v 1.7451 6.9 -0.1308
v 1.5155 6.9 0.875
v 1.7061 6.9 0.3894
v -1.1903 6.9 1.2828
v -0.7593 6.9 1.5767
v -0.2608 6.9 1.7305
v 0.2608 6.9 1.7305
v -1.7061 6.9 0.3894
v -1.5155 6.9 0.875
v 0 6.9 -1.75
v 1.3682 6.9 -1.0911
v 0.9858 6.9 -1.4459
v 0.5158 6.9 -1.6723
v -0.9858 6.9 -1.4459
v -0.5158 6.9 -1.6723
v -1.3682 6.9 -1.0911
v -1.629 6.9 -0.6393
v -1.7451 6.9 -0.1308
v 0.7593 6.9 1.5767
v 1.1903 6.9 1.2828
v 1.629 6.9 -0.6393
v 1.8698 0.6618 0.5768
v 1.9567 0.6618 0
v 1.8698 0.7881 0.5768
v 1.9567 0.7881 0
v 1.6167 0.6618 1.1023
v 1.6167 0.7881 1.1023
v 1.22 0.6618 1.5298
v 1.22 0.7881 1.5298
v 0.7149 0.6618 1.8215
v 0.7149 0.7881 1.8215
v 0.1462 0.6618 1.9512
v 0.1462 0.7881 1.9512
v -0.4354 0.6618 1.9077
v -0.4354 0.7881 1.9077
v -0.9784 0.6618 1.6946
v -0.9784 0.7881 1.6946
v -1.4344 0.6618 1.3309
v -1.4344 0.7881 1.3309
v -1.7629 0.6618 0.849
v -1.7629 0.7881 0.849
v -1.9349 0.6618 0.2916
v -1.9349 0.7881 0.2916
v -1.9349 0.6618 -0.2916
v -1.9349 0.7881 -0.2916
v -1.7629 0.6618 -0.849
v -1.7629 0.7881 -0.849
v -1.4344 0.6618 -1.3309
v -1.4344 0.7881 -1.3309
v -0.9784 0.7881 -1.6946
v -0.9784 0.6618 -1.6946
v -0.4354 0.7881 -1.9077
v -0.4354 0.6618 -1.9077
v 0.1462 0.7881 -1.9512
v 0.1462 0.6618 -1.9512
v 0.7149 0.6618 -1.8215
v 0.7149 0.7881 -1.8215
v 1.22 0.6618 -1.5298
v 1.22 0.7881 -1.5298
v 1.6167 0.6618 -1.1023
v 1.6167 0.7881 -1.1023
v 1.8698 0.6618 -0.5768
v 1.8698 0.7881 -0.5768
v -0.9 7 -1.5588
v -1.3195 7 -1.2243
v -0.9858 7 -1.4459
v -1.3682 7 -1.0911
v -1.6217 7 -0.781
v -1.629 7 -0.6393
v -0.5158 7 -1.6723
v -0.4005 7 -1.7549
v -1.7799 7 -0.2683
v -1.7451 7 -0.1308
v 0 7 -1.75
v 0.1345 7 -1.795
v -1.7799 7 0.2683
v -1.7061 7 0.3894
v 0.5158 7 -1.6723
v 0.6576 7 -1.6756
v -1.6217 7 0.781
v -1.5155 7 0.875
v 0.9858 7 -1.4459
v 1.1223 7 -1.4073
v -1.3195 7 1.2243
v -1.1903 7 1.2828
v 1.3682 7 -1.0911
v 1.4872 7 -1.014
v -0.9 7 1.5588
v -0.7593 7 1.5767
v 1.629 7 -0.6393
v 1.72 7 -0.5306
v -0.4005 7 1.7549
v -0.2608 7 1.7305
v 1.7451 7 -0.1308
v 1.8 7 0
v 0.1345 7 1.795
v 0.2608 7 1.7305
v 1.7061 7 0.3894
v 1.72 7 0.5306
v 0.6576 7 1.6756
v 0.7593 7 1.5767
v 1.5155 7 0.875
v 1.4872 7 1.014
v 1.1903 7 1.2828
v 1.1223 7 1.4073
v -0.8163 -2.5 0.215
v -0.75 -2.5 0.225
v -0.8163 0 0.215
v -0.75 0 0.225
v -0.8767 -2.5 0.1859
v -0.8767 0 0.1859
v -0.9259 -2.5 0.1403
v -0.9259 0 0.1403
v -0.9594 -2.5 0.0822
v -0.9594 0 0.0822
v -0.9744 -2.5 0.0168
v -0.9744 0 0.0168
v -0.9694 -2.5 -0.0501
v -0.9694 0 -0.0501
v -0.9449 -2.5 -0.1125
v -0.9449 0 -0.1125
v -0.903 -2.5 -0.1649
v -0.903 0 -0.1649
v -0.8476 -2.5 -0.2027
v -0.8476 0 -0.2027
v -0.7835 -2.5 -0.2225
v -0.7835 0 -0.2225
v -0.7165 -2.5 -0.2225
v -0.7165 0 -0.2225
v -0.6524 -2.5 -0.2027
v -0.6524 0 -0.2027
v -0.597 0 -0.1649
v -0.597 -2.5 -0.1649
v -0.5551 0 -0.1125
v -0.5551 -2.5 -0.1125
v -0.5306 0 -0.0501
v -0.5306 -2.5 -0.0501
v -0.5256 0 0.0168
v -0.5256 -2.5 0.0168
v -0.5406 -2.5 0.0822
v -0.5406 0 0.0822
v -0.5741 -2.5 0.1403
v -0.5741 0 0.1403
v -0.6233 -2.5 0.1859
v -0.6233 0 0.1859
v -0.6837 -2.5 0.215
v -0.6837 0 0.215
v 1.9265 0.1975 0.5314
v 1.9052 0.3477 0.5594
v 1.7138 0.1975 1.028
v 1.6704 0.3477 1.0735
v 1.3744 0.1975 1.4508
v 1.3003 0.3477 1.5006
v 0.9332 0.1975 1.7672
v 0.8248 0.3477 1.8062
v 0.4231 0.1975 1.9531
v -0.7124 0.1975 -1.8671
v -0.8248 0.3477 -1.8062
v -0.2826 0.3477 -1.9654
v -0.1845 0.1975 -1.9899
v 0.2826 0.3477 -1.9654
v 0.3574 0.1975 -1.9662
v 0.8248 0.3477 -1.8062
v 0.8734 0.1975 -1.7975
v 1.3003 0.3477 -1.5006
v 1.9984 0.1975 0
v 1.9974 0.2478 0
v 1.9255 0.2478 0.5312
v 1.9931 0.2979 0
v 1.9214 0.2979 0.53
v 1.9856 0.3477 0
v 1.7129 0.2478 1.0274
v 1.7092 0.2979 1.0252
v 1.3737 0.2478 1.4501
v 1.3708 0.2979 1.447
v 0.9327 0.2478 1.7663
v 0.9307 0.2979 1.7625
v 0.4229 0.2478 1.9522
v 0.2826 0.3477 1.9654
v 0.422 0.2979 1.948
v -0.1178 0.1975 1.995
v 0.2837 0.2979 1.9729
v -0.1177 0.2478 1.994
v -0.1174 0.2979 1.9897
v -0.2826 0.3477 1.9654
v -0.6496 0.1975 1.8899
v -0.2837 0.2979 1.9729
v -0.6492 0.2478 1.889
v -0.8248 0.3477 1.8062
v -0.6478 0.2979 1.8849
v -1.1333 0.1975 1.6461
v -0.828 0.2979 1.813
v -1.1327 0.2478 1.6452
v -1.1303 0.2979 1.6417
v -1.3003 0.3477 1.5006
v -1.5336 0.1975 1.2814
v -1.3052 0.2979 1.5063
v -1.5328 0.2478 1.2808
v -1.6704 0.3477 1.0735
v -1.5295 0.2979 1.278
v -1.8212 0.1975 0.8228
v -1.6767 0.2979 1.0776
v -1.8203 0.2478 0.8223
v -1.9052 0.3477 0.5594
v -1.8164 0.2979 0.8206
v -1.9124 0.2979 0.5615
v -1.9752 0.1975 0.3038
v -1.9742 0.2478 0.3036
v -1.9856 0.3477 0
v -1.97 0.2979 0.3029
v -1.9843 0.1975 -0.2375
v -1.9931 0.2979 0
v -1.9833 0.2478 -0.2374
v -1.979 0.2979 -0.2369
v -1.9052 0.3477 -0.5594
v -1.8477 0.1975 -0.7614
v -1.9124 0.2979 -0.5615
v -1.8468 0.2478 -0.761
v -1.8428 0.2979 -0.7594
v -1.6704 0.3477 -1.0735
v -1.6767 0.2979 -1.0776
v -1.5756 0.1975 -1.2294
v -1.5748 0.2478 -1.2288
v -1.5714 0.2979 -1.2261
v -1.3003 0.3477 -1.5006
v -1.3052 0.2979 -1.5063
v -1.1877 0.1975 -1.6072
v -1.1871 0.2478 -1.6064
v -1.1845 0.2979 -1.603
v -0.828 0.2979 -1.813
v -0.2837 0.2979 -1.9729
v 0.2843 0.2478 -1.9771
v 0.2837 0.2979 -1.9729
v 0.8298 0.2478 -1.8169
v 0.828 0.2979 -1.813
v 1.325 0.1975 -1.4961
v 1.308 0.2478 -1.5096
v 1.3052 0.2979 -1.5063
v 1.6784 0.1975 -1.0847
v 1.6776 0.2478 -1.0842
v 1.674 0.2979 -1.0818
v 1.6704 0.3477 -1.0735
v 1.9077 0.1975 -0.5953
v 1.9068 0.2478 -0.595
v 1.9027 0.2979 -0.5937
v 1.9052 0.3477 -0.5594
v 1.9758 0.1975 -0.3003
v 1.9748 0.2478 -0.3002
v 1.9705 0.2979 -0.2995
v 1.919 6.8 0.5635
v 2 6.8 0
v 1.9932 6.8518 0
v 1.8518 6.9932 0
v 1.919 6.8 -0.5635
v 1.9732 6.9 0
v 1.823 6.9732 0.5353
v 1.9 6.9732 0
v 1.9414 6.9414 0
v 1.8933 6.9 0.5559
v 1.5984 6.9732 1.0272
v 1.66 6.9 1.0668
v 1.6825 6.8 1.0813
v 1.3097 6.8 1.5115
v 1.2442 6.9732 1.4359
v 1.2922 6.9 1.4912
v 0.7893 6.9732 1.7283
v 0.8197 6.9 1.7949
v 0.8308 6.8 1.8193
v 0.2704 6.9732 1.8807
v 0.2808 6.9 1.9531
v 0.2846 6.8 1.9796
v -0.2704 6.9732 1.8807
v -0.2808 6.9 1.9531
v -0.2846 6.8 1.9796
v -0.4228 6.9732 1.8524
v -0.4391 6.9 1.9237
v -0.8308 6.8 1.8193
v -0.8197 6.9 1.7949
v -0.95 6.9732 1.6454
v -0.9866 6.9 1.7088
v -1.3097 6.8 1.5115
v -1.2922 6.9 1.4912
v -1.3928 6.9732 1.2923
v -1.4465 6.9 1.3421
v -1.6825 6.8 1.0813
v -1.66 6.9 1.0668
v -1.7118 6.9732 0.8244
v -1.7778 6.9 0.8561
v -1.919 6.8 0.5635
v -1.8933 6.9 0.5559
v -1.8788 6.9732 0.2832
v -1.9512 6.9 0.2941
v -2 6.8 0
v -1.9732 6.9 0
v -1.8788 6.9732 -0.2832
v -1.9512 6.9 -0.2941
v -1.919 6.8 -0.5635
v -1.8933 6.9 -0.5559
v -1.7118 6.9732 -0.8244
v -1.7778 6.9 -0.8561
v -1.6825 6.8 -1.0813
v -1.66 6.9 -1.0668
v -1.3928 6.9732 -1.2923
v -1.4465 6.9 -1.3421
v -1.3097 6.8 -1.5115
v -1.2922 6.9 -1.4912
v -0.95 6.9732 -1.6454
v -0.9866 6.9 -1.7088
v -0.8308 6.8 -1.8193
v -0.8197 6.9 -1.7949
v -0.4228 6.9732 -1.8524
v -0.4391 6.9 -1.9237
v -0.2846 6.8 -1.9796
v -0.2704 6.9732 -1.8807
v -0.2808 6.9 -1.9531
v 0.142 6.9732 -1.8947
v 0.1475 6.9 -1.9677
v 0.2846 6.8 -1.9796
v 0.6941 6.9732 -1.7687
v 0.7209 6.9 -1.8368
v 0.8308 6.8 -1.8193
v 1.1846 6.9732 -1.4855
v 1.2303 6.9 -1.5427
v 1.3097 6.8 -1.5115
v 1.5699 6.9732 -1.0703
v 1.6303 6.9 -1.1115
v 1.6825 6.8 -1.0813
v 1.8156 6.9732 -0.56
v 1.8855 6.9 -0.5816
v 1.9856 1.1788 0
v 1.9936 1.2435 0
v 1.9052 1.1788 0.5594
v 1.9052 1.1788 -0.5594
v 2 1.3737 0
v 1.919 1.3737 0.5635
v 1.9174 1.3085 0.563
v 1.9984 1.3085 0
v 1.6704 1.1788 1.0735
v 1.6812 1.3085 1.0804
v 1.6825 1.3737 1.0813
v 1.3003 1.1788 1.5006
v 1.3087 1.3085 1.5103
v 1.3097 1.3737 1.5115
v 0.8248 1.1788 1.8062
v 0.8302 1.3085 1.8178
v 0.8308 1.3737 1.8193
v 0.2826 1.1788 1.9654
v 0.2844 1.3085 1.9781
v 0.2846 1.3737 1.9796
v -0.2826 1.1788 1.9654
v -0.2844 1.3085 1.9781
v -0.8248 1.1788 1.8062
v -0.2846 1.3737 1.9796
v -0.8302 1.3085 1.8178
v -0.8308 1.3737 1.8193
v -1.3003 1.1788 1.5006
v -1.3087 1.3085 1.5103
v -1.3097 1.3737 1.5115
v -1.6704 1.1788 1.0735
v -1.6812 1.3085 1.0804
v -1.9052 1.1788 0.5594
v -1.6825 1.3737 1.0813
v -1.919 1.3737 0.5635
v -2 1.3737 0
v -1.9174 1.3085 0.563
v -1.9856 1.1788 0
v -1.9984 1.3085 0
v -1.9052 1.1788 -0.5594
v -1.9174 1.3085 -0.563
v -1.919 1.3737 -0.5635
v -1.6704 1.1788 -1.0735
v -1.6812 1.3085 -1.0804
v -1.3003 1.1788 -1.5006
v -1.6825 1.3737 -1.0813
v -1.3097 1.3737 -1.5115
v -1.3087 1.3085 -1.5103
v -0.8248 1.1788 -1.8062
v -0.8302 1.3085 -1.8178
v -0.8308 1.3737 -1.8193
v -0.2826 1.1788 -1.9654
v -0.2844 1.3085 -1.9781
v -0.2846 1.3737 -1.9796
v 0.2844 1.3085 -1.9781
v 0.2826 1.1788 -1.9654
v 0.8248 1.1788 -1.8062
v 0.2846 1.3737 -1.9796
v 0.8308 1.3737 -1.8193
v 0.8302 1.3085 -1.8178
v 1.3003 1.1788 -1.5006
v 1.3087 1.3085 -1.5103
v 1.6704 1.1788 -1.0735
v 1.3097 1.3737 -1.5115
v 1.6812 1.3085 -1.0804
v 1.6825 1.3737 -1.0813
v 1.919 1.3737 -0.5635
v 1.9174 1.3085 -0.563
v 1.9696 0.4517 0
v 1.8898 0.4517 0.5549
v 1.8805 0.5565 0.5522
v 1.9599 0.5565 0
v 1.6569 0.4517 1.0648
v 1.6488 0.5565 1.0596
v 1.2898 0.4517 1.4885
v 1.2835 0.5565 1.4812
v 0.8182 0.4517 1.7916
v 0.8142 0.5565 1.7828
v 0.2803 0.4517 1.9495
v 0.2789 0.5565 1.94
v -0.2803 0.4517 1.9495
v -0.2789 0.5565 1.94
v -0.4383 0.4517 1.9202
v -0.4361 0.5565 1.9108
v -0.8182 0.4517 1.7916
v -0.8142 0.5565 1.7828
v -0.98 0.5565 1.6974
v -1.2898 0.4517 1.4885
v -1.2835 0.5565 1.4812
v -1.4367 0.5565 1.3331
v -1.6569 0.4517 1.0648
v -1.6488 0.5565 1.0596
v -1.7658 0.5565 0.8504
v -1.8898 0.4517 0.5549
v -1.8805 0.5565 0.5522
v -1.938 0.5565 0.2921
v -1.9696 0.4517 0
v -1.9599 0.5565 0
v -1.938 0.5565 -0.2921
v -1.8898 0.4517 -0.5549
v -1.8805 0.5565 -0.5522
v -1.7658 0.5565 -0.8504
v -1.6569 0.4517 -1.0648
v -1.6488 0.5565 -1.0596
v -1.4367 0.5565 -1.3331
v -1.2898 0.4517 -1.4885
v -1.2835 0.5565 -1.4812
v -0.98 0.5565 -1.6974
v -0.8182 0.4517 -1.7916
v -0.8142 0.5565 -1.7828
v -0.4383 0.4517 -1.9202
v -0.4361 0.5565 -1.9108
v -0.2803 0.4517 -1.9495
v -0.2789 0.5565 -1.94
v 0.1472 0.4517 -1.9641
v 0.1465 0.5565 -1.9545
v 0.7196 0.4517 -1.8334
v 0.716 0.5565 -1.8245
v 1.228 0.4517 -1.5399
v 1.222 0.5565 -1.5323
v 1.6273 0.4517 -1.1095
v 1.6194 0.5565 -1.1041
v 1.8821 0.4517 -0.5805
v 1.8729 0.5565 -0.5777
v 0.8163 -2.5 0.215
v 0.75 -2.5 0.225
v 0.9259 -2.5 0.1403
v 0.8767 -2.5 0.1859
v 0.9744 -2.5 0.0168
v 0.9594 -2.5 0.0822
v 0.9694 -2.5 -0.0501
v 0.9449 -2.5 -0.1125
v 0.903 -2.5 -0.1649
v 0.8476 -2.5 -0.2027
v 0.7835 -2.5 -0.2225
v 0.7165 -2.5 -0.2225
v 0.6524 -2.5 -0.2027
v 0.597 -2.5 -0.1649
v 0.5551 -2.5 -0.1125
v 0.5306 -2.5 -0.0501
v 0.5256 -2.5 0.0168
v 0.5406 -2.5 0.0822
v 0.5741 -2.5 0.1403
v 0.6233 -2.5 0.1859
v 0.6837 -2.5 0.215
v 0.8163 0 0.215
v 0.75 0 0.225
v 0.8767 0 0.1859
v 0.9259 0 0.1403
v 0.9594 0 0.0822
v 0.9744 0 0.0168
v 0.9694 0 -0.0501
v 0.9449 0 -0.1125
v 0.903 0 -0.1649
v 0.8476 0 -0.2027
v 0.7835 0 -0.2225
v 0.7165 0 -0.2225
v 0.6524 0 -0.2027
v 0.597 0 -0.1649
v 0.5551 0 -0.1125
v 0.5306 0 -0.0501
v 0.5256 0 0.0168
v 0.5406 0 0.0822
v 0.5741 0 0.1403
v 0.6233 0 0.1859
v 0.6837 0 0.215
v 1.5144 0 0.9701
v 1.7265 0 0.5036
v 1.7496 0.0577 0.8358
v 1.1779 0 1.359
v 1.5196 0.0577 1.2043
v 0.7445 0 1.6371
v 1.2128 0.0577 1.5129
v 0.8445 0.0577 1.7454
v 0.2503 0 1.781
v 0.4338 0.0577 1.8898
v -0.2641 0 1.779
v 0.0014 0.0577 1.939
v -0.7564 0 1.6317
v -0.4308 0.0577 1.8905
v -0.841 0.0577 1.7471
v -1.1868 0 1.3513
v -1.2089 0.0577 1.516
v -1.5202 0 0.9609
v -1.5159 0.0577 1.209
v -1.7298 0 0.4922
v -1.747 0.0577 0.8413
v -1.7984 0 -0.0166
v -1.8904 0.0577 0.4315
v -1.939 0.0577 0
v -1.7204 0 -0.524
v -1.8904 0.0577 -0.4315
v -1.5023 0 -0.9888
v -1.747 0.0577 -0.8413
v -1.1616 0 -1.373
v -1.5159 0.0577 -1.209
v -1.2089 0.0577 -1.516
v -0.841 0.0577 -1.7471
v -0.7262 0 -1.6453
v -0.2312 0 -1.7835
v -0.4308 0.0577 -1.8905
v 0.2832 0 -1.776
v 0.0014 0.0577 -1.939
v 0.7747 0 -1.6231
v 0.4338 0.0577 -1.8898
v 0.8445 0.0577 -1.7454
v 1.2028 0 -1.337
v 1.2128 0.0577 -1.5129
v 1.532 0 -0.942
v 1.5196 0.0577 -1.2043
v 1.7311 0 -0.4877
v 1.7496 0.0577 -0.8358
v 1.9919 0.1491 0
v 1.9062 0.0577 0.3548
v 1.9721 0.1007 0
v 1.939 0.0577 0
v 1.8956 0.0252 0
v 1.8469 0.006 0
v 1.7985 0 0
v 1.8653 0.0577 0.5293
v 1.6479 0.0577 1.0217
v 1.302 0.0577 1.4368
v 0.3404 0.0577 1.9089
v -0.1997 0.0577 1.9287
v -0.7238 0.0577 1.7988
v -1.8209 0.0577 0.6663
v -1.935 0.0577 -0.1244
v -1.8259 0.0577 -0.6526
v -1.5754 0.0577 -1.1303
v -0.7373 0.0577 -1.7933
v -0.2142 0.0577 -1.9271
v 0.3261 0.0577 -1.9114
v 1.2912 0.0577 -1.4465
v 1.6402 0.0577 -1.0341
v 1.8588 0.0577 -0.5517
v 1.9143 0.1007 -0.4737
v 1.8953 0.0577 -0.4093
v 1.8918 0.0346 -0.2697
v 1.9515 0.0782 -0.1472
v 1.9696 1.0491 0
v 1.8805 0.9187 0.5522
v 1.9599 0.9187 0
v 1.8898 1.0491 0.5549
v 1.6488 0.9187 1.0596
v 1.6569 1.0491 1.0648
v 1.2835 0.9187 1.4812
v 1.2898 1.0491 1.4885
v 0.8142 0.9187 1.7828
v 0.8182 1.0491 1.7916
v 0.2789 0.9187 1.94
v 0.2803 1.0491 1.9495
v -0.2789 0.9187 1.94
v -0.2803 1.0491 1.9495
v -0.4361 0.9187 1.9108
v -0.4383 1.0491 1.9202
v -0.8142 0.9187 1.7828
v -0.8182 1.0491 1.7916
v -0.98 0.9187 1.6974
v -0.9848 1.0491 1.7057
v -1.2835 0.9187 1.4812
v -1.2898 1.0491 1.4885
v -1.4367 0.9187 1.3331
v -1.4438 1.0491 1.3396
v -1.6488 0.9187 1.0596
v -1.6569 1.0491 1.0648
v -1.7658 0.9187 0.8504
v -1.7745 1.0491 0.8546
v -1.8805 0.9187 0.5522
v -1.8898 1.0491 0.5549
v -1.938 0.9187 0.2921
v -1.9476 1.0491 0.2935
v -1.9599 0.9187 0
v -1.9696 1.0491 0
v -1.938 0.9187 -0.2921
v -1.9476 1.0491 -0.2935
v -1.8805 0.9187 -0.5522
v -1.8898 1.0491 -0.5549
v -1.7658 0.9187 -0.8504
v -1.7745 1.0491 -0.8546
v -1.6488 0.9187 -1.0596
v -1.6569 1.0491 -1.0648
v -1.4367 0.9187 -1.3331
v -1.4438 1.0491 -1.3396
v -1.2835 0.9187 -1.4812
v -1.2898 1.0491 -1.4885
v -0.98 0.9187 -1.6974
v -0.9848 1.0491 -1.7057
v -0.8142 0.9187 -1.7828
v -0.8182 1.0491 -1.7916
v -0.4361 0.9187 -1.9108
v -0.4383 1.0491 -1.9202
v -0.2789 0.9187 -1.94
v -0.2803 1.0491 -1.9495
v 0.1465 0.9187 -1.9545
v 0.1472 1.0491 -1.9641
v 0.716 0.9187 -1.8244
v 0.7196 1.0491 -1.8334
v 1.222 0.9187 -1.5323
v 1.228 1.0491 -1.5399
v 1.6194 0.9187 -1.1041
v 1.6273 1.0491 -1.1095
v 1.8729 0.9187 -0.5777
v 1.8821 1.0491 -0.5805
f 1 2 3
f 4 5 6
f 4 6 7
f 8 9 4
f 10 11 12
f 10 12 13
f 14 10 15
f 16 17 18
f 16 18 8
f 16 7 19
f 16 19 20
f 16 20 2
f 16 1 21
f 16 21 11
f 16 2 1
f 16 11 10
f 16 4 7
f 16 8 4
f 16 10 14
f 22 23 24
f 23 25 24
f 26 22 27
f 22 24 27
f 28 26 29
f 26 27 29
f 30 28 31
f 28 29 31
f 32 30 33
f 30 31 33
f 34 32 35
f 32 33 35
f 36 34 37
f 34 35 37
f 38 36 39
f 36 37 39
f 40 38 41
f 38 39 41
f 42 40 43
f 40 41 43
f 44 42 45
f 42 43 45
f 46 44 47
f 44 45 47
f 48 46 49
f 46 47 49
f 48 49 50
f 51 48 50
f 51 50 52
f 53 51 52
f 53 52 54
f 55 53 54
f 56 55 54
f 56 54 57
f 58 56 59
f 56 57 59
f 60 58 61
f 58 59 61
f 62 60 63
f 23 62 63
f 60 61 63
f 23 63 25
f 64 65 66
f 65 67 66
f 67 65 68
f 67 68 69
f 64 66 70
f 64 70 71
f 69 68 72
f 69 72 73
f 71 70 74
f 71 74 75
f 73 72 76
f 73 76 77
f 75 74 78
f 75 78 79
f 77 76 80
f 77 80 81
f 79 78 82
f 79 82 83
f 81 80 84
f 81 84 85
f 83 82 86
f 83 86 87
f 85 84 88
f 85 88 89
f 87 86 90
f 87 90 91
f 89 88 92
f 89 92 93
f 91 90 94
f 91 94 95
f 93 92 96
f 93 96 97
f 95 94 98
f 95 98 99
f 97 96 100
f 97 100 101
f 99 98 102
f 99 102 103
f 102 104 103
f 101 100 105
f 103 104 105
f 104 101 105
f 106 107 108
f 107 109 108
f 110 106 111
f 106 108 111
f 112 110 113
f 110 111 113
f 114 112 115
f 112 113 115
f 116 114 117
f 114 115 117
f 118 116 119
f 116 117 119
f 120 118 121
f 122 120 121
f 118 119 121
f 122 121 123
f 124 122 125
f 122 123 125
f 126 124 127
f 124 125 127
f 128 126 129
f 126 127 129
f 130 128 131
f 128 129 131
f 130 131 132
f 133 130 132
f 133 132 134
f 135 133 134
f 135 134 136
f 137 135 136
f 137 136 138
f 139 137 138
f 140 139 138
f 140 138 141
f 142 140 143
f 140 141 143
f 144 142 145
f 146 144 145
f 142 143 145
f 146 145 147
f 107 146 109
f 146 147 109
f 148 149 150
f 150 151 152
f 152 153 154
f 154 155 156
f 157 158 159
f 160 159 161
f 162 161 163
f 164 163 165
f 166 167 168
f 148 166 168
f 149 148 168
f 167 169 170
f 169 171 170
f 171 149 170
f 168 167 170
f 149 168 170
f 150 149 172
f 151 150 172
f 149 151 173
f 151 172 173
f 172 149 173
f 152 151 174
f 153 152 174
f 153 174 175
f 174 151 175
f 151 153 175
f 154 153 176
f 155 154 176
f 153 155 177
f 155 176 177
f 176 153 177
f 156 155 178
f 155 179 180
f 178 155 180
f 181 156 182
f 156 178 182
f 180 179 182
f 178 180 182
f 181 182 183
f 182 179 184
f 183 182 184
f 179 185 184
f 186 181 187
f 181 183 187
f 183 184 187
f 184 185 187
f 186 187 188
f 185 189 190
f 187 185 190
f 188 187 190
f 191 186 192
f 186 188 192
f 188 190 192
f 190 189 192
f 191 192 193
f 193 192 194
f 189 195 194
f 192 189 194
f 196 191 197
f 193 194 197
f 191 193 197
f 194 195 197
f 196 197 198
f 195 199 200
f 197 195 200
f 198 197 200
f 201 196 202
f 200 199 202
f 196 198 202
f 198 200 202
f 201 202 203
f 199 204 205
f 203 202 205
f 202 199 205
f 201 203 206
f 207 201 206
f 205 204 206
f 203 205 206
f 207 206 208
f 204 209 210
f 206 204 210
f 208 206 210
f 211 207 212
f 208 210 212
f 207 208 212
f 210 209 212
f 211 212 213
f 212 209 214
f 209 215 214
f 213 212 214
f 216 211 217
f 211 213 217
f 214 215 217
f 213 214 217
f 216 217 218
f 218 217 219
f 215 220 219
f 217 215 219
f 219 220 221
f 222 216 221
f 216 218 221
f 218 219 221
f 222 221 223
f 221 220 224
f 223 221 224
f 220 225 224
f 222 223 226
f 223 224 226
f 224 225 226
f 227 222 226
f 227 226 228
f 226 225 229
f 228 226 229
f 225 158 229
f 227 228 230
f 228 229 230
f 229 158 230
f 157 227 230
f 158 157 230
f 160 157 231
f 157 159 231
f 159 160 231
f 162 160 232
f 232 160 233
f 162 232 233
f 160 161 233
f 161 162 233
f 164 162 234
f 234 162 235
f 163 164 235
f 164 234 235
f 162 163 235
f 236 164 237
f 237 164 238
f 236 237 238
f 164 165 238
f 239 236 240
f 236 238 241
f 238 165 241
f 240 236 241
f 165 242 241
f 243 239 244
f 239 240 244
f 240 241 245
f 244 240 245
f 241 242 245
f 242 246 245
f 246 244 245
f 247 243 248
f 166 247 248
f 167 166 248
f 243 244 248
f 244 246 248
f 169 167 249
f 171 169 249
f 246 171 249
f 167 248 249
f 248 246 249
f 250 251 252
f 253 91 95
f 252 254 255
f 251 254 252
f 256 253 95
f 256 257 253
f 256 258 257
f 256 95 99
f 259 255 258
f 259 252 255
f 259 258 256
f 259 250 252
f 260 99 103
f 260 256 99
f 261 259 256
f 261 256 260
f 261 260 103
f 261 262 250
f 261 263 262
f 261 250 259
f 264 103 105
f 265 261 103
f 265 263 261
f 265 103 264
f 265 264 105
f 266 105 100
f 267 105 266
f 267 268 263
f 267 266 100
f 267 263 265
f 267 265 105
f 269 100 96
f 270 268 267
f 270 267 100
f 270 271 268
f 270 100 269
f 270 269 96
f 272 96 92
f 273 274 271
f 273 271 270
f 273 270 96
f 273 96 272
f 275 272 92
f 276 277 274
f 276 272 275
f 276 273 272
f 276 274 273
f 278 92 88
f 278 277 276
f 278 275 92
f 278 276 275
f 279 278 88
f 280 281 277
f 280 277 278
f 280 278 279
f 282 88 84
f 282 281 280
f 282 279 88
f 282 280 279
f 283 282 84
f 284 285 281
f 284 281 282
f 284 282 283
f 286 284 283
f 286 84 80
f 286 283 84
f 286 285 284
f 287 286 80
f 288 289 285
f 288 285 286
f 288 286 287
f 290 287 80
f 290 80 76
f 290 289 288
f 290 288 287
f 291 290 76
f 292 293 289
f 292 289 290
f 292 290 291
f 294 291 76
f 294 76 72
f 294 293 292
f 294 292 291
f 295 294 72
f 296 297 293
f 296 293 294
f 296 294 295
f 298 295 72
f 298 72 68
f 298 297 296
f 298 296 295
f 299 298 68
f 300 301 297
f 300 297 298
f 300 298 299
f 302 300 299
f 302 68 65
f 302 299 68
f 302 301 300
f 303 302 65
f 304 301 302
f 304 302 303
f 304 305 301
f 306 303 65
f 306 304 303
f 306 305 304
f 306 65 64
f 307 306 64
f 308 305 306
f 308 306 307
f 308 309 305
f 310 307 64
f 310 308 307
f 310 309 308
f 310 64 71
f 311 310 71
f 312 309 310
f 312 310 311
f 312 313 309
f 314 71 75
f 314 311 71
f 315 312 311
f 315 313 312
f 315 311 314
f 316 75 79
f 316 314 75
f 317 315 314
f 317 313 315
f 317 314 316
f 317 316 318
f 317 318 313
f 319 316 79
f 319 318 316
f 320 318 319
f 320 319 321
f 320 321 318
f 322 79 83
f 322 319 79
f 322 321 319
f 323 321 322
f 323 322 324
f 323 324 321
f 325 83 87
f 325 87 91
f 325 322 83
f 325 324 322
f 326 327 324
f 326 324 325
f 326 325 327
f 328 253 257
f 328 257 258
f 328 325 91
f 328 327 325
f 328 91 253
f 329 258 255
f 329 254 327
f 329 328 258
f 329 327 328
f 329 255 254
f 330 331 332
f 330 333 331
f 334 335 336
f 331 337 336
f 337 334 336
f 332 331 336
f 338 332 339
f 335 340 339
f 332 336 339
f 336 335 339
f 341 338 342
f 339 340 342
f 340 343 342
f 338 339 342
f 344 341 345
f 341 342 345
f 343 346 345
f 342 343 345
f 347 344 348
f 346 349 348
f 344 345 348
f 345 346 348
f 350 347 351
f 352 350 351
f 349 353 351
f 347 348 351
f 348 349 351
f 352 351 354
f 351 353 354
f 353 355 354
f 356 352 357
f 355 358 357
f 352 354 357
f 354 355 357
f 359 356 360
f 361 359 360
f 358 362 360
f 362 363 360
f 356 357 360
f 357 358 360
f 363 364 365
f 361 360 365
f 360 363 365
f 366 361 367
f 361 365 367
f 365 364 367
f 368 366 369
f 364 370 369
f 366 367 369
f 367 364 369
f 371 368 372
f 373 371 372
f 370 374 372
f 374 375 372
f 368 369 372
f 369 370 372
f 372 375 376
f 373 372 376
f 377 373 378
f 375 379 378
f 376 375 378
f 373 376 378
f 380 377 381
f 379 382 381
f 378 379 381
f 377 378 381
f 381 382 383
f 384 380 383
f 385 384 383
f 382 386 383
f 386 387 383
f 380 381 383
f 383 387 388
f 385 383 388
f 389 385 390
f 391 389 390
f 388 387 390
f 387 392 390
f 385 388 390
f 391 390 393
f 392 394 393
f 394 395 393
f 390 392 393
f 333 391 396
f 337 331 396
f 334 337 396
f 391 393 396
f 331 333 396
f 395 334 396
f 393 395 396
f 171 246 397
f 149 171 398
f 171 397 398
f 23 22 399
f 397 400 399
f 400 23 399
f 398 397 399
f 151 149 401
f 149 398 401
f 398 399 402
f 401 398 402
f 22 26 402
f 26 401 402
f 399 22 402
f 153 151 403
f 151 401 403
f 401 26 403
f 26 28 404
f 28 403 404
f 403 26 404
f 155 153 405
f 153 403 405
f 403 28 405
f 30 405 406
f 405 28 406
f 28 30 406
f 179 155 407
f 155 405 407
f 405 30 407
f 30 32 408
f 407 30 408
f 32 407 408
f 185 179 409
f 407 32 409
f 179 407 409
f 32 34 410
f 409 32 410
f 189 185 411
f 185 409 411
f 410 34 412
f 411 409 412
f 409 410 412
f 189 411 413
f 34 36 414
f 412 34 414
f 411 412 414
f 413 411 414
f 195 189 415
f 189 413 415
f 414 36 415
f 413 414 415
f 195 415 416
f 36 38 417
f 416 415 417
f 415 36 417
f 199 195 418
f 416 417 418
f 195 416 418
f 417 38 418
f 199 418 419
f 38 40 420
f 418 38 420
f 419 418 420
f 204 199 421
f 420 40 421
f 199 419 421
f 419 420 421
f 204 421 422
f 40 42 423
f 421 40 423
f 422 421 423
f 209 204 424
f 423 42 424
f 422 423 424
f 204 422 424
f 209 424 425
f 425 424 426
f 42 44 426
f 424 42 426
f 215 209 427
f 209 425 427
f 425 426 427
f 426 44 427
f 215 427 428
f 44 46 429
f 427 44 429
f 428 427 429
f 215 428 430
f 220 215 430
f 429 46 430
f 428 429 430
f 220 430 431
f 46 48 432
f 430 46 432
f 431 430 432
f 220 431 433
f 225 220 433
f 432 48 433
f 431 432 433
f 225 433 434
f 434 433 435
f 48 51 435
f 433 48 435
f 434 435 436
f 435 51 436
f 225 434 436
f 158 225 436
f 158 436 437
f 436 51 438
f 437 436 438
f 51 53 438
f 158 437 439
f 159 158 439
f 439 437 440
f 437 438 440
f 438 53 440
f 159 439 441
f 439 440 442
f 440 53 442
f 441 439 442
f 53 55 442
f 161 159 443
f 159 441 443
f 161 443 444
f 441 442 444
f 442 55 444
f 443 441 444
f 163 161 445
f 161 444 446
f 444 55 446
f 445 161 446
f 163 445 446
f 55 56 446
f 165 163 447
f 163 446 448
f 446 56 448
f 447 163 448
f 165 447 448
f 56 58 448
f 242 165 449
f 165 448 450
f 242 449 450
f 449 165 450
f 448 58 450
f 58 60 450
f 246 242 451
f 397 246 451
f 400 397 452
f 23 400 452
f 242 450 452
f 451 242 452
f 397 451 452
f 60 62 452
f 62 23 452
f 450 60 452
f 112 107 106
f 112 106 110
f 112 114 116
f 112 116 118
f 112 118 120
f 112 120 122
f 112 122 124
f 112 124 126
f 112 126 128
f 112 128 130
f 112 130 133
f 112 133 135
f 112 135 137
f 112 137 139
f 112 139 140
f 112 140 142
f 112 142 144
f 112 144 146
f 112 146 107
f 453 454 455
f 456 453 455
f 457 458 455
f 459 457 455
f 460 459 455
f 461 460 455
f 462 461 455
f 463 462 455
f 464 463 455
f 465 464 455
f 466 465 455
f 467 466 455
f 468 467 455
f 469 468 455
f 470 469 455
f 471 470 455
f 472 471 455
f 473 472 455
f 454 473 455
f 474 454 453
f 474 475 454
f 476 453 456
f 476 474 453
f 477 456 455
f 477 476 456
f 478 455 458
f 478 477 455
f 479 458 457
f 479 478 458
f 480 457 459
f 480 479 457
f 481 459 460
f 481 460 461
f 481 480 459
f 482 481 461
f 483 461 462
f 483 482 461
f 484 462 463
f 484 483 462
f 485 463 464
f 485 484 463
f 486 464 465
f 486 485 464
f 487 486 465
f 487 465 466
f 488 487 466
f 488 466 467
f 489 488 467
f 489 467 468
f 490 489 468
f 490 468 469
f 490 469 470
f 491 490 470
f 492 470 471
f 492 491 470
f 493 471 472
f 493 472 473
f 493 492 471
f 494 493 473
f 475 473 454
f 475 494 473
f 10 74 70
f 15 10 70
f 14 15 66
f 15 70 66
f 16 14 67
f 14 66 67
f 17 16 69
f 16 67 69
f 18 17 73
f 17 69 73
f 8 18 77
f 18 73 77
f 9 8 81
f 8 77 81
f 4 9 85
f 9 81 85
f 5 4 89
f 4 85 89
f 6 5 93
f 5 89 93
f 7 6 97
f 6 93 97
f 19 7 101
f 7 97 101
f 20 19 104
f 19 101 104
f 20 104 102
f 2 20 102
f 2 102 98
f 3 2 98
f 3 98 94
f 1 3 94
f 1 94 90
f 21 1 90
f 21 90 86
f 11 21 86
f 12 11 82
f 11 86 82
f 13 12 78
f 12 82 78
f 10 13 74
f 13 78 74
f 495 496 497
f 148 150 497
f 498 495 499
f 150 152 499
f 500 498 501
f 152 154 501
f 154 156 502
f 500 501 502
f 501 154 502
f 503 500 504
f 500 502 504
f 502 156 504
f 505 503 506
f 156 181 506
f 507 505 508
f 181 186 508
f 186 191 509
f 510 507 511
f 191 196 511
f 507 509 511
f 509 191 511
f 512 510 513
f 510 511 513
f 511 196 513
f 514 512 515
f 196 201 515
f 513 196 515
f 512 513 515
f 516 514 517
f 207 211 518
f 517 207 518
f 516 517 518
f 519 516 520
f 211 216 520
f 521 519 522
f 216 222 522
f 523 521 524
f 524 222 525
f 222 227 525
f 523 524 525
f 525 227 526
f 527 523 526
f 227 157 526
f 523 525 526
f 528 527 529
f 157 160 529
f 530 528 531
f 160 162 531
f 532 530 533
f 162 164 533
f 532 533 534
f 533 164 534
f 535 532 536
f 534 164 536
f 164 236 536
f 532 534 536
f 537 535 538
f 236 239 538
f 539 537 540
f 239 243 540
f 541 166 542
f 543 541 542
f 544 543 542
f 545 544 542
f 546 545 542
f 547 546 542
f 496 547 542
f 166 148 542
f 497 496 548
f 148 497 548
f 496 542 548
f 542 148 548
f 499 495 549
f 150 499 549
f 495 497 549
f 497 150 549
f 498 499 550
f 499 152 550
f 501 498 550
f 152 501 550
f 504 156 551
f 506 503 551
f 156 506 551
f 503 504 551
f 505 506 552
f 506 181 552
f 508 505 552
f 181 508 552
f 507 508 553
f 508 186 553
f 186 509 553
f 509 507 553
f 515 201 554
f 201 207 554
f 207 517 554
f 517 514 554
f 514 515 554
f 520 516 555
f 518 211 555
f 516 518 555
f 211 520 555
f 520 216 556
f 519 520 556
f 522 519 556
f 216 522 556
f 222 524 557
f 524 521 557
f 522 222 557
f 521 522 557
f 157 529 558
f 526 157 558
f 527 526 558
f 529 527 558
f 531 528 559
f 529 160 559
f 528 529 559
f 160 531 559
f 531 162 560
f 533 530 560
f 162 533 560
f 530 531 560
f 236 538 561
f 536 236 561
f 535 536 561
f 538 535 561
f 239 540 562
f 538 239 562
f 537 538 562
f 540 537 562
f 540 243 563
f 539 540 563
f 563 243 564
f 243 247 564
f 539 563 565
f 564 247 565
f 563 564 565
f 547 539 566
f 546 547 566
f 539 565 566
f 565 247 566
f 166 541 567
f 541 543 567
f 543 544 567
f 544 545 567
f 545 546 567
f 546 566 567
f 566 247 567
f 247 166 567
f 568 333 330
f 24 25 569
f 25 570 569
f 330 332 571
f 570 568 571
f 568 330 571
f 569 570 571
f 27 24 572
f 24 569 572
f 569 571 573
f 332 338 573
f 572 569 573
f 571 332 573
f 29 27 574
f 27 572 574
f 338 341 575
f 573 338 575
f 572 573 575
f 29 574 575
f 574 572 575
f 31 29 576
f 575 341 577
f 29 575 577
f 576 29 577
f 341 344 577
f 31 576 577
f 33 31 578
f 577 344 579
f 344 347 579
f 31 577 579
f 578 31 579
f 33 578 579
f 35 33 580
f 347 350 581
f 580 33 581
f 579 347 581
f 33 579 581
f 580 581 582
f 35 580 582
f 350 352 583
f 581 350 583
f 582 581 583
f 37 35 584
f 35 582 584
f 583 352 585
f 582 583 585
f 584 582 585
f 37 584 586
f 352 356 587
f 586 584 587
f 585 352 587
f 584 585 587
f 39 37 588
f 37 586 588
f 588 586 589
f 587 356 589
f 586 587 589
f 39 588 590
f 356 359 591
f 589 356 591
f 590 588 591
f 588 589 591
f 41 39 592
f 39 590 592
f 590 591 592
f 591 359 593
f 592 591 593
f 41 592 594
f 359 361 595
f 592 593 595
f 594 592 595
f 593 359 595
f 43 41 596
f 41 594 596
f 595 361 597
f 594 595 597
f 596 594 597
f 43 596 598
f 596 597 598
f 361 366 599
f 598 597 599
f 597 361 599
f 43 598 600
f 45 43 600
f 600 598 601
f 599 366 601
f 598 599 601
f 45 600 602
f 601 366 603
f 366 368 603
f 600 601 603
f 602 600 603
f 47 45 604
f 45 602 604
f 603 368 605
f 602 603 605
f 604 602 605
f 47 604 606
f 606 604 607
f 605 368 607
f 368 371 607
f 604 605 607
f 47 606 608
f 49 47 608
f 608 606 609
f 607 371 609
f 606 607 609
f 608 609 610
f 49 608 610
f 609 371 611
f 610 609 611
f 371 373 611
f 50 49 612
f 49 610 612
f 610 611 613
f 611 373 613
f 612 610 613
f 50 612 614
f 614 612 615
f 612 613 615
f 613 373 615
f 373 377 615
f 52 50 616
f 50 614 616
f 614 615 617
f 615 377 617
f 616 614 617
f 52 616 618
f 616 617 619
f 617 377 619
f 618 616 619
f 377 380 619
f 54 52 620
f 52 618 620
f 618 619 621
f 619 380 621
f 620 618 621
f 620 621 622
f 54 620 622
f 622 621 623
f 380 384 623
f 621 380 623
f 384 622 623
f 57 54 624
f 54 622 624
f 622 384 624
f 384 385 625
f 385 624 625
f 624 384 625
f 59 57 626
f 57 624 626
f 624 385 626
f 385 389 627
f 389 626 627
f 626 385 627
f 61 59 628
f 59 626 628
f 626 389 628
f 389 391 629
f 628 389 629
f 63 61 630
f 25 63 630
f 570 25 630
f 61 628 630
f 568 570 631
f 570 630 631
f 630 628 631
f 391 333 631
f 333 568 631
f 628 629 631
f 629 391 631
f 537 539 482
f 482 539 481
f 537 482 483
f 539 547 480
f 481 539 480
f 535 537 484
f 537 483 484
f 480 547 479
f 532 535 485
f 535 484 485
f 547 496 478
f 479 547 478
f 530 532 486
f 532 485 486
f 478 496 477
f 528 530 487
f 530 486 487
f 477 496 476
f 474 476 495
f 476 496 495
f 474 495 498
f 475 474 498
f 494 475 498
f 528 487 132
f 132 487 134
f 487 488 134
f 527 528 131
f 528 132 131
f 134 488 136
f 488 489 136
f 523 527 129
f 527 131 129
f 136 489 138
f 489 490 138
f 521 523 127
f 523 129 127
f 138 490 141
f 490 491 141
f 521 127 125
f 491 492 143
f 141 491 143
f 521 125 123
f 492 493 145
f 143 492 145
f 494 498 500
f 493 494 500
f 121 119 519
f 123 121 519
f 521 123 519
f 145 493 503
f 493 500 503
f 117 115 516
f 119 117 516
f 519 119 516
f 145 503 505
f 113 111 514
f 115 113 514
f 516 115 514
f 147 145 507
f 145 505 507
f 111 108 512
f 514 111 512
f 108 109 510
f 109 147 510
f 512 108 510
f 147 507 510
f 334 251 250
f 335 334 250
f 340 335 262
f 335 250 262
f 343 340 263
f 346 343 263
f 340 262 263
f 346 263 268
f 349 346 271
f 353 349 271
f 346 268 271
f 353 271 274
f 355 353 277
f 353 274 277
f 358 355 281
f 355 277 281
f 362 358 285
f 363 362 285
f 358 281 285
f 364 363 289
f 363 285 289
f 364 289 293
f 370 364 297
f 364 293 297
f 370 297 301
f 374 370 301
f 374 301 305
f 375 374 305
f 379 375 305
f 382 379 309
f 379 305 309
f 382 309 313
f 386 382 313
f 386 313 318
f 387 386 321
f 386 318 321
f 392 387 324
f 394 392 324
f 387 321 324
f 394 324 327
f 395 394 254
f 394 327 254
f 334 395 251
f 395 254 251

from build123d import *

# Parameters (mm, degrees)
SKETCH2_R          = 1.75
CUT_EXTRUDE1_DEPTH = 0.1
SKETCH4_W          = 0.225
SKETCH4_H          = 2.5
FILLET1_R          = 0.2


with BuildPart() as part:
    # Sketch1 → Revolve1 (revolve)
    with BuildSketch(Plane.XY):
        with BuildLine():
            Line((2, 7), (0, 7))
            Line((0, 7), (0, 0))
            Line((0, 0), (1.970115999, 0))
            ThreePointArc((1.970115999, 0), (1.997744783, 0.172945308), (1.985594939, 0.347661679))
            ThreePointArc((1.985594939, 0.347661679), (1.963952003, 0.504056499), (1.956717438, 0.661775925))
            Line((1.956717438, 0.661775925), (1.956717438, 0.788075836))
            ThreePointArc((1.956717438, 0.788075836), (1.963946646, 0.983958609), (1.985594939, 1.178775635))
            ThreePointArc((1.985594939, 1.178775635), (1.99639383, 1.275956871), (2, 1.373669737))
            Line((2, 1.373669737), (2, 7))
        make_face()
    revolve(axis=Axis((0, 7, 0), (0, -1, 0)))

    # Sketch2 → Cut-Extrude1 (cut)
    with BuildSketch(Plane(origin=(0, 7, 0), x_dir=(-1, 0, 0), z_dir=(0, 1, 0))):
        with Locations(Location((0, 0, 0), (0, 0, 270))):
            Circle(SKETCH2_R)
    extrude(amount=-CUT_EXTRUDE1_DEPTH, mode=Mode.SUBTRACT)

    # Sketch4 → Revolve2 (revolve)
    with BuildSketch(Plane(origin=(0, 0, 0), x_dir=(-1, 0, 0), z_dir=(0, 0, -1)), mode=Mode.PRIVATE) as revolve2_sk:
        with Locations((-0.8625, -1.25)):
            Rectangle(SKETCH4_W, SKETCH4_H)
    revolve2 = revolve(revolve2_sk.sketch.rotate(Axis((0.75, -2.5, 0), (0, 1, 0)), 270), axis=Axis((0.75, -2.5, 0), (0, 1, 0)))

    # Fillet1
    fillet1_edges = [part.edges().sort_by_distance(p)[0] for p in [
        (-2, 7, 0),
        (-1.970115999, 0, 0),
    ]]
    fillet(fillet1_edges, radius=FILLET1_R)

    # Simetría3: Revolve2 across plane
    add(revolve2.mirror(Plane(origin=(0, 0, 0), x_dir=(0, 0, 1), z_dir=(1, 0, 0))))


solid = part.part
